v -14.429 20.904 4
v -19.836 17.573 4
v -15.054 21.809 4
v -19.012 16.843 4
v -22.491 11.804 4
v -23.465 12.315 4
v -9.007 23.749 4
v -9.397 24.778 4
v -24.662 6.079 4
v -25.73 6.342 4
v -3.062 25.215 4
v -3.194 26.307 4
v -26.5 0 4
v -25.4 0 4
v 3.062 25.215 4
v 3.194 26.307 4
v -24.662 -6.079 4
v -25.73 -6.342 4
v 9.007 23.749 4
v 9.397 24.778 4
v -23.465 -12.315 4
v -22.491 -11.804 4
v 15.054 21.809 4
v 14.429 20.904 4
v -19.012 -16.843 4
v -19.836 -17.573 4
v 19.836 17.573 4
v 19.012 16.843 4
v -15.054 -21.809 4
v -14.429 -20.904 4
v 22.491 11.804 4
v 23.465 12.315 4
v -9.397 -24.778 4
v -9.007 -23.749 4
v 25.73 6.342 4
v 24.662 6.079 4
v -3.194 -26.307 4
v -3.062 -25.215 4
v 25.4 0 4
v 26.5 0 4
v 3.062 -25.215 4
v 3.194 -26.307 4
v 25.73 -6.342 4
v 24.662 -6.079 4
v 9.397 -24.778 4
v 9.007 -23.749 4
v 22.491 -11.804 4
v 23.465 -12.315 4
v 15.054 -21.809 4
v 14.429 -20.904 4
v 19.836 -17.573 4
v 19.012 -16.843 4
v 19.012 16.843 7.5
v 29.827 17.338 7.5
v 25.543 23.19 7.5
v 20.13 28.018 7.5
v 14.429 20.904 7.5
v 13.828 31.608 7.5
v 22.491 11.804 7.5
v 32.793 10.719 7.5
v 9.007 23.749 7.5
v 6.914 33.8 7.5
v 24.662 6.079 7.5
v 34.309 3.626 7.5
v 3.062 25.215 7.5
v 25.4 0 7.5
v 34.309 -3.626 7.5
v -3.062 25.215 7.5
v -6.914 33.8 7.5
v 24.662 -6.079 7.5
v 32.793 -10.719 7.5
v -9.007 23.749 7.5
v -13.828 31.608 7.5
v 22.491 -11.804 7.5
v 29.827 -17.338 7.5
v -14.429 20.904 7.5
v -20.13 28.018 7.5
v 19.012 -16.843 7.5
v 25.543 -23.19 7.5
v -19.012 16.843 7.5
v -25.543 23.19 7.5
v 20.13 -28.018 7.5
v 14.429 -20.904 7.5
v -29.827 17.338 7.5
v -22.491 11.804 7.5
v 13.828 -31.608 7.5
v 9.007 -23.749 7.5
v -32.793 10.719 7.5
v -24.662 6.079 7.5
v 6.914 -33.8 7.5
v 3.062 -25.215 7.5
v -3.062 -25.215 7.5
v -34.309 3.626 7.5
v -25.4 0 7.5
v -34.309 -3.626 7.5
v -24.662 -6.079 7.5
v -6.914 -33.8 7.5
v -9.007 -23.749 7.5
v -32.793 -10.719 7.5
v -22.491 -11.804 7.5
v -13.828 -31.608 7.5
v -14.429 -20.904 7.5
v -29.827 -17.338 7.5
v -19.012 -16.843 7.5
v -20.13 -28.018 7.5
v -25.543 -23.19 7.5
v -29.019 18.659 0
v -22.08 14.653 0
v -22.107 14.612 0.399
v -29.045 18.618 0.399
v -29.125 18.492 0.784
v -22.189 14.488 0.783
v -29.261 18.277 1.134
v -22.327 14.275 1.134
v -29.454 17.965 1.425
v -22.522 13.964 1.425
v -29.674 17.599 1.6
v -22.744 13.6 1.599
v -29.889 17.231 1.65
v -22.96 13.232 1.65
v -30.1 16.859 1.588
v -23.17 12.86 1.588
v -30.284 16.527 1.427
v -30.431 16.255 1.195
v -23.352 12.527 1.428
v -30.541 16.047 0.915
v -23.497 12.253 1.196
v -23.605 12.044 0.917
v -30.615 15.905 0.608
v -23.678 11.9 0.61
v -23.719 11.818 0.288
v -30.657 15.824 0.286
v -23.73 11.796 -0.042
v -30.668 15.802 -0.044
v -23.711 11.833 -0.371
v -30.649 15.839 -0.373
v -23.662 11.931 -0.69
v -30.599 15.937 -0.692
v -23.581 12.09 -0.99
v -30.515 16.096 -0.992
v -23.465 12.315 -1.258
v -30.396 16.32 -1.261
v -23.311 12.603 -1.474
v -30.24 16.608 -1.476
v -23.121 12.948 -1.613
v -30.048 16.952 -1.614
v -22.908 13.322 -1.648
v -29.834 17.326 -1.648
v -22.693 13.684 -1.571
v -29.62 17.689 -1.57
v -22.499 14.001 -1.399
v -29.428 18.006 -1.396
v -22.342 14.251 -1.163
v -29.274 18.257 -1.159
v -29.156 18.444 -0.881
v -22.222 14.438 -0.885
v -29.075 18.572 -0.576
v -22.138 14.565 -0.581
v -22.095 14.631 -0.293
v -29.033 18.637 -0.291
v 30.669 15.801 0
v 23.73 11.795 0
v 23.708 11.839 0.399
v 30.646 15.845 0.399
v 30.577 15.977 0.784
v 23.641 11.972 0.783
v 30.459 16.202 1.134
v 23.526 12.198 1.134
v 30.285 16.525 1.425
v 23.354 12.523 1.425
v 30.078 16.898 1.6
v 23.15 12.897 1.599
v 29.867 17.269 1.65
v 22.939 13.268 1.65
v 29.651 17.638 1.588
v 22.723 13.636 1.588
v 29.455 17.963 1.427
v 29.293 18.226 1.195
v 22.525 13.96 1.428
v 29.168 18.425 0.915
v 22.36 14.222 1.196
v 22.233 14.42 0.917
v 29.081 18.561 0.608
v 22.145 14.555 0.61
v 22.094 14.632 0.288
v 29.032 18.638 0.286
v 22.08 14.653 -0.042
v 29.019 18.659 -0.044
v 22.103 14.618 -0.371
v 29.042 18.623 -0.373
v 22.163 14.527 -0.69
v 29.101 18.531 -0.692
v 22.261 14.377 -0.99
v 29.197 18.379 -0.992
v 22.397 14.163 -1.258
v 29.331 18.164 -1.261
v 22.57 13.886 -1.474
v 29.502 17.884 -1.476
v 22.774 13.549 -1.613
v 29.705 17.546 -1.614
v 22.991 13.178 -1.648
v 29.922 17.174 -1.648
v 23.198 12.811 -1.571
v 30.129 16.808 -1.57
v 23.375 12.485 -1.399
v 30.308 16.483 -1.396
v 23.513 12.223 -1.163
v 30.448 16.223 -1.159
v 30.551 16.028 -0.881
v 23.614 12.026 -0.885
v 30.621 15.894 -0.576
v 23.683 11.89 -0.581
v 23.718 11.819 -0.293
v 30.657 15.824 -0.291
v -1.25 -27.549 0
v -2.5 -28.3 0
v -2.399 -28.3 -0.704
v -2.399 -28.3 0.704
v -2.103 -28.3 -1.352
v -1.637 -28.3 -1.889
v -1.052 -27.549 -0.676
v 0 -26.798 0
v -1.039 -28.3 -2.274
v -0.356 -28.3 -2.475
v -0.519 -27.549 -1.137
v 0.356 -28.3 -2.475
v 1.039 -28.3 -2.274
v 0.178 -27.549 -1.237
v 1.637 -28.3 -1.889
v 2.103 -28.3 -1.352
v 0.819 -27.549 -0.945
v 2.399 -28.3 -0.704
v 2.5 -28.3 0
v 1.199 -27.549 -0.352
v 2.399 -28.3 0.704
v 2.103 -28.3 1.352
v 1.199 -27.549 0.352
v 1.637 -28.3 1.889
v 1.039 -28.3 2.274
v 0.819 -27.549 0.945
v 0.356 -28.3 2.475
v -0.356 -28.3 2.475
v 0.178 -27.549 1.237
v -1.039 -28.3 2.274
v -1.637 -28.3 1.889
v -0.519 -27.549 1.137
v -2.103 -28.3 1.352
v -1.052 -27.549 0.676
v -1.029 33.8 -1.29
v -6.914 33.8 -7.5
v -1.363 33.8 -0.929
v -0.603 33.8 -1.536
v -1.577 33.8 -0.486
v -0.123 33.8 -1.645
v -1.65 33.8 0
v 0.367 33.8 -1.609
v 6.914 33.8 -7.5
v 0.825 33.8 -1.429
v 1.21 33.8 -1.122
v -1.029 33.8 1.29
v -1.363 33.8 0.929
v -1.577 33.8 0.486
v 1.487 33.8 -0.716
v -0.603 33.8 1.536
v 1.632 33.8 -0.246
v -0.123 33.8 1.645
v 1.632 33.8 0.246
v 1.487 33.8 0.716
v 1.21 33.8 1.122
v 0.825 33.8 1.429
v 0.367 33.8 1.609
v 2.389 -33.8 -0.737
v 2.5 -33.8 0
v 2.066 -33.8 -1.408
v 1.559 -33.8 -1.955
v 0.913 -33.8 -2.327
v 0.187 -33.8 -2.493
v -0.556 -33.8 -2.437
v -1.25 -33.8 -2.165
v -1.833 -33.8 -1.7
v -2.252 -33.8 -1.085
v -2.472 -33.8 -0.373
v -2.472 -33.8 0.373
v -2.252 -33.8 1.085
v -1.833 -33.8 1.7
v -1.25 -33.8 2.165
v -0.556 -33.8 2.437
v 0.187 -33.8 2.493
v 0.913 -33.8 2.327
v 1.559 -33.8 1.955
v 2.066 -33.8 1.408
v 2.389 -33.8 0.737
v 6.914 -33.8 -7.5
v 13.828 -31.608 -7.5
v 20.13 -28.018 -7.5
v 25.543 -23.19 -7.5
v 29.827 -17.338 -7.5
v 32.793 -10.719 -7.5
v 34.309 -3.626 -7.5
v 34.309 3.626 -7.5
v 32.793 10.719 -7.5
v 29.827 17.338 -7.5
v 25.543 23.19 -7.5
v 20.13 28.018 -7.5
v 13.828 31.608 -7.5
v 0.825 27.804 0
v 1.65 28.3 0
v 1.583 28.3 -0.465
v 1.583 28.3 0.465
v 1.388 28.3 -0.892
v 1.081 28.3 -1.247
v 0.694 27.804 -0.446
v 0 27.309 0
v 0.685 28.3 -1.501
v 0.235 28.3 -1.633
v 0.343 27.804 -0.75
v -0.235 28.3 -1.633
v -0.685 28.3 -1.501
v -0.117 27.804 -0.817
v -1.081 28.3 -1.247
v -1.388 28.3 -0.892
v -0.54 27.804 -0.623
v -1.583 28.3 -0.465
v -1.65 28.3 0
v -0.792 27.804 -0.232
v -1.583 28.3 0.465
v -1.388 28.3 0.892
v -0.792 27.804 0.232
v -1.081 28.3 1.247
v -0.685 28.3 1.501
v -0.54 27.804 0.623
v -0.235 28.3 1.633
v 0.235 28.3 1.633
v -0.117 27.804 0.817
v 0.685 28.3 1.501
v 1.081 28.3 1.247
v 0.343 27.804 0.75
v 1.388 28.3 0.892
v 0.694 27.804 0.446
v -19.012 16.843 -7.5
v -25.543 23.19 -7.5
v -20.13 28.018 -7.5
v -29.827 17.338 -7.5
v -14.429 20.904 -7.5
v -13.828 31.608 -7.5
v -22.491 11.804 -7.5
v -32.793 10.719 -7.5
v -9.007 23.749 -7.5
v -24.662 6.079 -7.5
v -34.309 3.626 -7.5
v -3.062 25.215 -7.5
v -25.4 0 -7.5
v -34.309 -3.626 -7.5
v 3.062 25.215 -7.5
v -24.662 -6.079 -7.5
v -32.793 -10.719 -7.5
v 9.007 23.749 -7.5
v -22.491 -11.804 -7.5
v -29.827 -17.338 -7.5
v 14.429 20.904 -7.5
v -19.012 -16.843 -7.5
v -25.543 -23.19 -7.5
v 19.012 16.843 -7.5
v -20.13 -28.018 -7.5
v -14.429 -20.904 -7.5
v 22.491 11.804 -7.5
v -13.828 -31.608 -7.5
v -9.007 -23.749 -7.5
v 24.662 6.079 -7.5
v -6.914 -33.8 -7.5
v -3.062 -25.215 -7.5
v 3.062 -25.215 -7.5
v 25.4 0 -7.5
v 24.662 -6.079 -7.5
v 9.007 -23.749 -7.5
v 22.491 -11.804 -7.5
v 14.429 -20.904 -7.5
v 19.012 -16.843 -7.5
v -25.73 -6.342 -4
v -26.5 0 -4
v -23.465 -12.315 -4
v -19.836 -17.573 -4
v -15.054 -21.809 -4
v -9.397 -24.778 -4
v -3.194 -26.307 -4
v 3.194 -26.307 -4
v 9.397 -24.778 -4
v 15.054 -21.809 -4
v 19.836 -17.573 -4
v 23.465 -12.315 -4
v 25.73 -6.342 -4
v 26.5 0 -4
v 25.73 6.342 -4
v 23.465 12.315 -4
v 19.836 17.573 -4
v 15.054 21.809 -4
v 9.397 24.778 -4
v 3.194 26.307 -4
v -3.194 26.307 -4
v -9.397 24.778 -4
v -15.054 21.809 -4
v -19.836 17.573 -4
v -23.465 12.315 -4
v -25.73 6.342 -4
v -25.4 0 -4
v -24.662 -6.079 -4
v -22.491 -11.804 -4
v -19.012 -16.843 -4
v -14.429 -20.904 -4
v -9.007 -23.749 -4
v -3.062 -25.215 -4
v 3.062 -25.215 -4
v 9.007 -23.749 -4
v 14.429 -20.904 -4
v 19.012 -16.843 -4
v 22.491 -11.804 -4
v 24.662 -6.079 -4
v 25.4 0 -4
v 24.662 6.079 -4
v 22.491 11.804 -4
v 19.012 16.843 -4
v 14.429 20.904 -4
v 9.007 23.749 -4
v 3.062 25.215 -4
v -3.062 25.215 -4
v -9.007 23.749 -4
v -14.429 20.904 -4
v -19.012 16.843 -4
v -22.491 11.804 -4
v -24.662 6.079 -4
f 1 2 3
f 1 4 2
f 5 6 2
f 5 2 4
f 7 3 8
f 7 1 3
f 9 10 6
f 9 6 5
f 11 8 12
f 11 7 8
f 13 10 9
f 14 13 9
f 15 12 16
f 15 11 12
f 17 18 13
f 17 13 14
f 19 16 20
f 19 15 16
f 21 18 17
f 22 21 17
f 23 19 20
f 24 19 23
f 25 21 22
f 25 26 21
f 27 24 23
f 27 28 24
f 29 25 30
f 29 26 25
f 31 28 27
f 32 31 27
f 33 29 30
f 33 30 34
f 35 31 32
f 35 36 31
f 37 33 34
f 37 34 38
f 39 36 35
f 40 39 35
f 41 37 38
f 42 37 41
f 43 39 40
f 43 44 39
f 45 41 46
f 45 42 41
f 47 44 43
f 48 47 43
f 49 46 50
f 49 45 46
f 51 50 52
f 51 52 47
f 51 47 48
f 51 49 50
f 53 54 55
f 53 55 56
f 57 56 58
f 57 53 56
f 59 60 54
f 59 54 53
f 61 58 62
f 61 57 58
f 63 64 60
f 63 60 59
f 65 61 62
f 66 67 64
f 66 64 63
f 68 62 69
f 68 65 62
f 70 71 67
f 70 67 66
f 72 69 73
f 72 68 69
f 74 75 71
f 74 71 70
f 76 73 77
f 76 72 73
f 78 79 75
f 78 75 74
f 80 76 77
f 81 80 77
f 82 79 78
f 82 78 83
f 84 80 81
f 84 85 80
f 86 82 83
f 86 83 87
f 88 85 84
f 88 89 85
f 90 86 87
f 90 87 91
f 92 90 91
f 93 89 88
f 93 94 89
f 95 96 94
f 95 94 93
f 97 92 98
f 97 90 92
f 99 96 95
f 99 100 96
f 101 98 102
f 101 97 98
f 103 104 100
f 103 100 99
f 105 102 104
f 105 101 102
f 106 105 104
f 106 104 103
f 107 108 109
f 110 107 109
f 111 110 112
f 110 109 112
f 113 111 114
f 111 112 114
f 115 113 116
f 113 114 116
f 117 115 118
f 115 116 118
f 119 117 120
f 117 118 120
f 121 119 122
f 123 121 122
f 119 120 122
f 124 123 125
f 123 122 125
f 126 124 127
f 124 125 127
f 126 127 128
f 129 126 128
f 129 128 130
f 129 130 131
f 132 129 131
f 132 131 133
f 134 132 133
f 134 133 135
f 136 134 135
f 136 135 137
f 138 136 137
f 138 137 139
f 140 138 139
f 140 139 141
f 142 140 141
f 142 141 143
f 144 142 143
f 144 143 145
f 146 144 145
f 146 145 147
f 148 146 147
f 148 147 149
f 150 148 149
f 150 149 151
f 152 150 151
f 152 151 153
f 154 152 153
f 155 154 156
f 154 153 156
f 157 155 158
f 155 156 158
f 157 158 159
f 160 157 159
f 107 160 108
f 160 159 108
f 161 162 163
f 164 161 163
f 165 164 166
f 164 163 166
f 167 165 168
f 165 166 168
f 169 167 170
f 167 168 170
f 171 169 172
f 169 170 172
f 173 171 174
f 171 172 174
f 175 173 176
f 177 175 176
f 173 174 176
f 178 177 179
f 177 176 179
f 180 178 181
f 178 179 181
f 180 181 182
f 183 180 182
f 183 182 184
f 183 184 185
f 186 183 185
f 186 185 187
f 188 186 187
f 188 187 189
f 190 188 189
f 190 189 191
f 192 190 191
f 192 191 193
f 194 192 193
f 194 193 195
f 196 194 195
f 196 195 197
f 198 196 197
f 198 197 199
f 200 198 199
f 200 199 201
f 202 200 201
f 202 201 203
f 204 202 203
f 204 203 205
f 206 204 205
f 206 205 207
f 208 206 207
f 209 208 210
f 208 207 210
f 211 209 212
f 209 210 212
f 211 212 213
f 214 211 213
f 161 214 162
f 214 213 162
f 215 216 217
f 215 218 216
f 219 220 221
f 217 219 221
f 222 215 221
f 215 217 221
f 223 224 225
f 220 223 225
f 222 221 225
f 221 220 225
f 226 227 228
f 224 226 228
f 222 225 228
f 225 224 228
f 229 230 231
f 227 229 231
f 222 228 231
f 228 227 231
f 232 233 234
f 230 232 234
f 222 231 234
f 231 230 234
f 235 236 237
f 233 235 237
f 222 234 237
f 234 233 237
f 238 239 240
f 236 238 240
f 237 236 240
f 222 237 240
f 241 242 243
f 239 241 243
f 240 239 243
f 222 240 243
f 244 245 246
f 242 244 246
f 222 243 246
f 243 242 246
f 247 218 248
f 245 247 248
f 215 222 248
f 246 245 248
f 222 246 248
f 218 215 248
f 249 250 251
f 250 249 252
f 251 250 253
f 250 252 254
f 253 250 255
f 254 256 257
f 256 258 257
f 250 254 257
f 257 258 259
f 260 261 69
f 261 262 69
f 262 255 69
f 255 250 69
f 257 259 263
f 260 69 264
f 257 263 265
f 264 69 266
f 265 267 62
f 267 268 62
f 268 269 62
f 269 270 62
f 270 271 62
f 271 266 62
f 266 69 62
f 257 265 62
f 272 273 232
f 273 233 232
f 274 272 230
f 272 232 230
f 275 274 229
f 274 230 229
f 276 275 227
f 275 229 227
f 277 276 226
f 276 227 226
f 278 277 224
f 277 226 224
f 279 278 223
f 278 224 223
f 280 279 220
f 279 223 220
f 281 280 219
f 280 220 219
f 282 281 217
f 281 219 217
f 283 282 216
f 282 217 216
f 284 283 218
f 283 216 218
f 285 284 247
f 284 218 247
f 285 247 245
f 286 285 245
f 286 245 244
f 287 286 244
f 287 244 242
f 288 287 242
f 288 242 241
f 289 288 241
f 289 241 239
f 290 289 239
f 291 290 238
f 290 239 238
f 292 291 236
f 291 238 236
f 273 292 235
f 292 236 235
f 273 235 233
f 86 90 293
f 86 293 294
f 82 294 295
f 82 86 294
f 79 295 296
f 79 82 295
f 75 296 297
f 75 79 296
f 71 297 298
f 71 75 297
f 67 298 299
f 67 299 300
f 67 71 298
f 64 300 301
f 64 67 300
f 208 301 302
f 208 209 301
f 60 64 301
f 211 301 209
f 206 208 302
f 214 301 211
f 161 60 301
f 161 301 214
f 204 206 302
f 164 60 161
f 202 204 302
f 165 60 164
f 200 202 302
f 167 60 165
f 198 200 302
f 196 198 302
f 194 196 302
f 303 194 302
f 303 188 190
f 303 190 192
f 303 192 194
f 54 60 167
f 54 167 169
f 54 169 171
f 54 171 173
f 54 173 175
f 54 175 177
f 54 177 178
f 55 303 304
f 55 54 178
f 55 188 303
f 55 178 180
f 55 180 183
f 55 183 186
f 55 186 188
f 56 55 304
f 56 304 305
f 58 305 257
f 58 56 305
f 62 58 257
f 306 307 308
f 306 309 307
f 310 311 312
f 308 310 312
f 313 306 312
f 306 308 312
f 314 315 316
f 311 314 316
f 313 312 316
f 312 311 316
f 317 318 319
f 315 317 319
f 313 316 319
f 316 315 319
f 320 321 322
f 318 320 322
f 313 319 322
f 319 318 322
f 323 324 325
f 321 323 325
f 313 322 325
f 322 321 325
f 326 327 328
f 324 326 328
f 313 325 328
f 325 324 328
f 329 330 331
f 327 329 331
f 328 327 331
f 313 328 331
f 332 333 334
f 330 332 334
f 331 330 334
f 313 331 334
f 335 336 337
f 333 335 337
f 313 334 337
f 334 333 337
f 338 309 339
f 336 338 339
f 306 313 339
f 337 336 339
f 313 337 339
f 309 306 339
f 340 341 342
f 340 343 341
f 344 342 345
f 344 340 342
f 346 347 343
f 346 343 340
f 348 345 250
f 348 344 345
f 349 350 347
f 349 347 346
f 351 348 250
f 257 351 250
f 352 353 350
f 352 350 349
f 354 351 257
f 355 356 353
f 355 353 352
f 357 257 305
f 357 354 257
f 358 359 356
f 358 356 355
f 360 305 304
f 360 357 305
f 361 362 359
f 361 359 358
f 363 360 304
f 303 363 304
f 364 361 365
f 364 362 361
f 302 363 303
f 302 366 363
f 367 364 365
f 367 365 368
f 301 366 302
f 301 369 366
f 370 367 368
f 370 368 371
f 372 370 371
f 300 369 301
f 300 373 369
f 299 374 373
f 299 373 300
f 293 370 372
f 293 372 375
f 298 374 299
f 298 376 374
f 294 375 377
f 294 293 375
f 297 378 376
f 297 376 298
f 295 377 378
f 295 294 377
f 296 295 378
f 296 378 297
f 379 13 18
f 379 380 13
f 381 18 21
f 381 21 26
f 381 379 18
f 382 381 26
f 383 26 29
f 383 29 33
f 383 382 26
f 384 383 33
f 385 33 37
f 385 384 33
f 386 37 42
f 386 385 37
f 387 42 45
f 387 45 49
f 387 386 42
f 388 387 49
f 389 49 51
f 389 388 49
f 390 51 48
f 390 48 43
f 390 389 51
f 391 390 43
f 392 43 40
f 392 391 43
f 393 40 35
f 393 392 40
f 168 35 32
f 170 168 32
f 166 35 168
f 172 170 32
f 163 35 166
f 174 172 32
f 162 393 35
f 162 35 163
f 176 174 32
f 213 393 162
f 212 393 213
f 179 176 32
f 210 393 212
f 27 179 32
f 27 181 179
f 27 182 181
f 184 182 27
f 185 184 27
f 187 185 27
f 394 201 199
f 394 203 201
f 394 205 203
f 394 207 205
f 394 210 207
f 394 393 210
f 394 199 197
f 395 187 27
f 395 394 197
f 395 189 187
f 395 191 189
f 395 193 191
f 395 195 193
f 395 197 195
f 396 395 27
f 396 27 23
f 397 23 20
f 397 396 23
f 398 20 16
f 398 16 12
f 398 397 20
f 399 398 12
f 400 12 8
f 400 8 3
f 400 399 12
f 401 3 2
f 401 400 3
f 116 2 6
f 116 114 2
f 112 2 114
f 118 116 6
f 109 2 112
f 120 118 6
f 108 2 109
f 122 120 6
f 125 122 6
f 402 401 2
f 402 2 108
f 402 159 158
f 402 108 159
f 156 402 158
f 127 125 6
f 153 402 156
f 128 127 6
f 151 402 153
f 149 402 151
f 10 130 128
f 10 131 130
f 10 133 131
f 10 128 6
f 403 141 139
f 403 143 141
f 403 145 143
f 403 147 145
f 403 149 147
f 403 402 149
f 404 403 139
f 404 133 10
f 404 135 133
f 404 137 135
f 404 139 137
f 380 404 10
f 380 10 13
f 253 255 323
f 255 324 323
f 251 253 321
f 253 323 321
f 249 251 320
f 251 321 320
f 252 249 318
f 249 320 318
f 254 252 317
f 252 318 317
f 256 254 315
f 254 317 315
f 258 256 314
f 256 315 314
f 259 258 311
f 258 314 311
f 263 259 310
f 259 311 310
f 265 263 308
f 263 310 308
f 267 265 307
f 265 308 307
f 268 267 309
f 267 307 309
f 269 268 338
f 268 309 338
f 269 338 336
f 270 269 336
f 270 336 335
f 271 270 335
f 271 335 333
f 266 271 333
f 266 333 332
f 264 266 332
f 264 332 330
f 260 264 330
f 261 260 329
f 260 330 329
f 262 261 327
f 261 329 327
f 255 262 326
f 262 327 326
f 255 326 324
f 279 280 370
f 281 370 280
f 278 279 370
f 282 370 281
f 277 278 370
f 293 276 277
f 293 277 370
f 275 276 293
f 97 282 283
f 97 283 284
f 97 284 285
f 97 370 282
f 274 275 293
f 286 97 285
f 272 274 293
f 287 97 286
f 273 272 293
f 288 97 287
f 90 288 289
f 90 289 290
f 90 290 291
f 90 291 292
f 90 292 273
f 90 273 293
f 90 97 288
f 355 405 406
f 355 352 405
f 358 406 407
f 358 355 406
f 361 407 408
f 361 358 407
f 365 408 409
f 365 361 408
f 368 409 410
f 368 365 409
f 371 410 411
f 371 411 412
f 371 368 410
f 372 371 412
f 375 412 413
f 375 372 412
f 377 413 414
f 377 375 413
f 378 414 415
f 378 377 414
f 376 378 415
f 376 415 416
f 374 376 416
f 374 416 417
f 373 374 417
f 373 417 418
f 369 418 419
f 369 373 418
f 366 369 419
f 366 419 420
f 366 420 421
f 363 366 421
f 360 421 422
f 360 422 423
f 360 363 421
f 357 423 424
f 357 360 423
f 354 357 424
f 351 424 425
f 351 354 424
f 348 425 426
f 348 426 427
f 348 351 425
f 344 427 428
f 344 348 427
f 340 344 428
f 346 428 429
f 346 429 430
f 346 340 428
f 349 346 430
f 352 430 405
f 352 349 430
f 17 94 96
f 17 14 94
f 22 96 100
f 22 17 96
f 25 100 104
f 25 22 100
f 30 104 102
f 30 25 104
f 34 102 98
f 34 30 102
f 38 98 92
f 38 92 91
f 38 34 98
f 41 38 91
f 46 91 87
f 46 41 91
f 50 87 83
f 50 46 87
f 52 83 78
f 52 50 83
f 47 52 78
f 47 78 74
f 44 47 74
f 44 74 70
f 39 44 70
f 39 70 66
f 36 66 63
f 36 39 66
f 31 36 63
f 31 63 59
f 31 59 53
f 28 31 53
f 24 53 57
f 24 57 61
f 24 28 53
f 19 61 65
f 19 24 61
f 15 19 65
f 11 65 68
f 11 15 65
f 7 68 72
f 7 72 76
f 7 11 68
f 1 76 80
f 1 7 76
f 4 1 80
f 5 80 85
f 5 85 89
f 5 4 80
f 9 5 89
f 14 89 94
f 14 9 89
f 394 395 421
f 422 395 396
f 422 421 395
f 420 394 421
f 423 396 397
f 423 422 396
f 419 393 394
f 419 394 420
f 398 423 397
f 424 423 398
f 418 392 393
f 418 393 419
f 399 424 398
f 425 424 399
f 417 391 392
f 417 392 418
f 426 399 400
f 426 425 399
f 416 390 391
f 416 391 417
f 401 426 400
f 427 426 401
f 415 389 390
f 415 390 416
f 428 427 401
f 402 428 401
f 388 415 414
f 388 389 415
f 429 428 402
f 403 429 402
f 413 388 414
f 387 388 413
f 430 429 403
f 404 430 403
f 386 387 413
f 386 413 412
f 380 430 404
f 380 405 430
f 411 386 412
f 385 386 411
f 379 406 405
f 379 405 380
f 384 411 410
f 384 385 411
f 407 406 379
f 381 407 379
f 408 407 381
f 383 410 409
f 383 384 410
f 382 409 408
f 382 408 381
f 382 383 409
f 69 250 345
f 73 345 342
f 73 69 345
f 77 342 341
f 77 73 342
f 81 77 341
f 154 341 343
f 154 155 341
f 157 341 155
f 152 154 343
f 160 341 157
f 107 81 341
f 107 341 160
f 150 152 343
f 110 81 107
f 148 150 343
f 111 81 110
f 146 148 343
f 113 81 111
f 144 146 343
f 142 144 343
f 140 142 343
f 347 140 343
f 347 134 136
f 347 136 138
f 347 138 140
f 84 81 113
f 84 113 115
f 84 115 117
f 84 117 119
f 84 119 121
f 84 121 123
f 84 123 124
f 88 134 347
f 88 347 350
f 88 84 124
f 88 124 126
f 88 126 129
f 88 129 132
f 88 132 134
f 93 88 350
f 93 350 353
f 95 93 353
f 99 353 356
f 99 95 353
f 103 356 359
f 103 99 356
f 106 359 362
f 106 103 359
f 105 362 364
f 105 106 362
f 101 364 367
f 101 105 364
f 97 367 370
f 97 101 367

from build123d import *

# Parameters (mm, degrees)
SKETCH_2_W                       = 64.02174429
SKETCH_2_H                       = 9.248919907
CUT_EXTRUDE_1_DEPTH              = 49
HOLE_WIZARD_M4_2_D               = 3.3
HOLE_WIZARD_M4_2_DEPTH           = 5.5
HOLE_WIZARD_M4_2_TIP             = 0.991420021
HOLE_WIZARD_M6_2_D               = 5
HOLE_WIZARD_M6_2_DEPTH           = 5.5
HOLE_WIZARD_M6_2_TIP             = 1.502151548
HOLE_WIZARD_M4_3_D               = 3.3
HOLE_WIZARD_M4_3_DEPTH           = 13.4
HOLE_WIZARD_M4_3_TIP             = 0.991420021
HOLE_WIZARD_M4_3_ON_FACE_2_D     = 3.3
HOLE_WIZARD_M4_3_ON_FACE_2_DEPTH = 13.4
HOLE_WIZARD_M4_3_ON_FACE_2_TIP   = 0.991420021


with BuildPart() as part:
    # 草图1 → 旋转1 (revolve)
    with BuildSketch(Plane(origin=(0, 0, 0), x_dir=(1, 0, 0), z_dir=(0, 1, 0)), mode=Mode.PRIVATE) as revolve_1_sk:
        Polygon((34.5, 7.5), (34.5, -7.5), (25.4, -7.5), (25.4, -4), (26.5, -4), (26.5, 4), (25.4, 4), (25.4, 7.5), align=None)
    revolve(revolve_1_sk.sketch.rotate(Axis((0, 0, -31.9390681), (0, 0, 1)), 180), axis=Axis((0, 0, -31.9390681), (0, 0, 1)))  # turned: the seam where the file's is

    # 草图2 → 切除-拉伸1 (cut)
    with BuildSketch(Plane.XY.offset(7.5)):
        with Locations((-1.141100508, 38.424459954)):
            Rectangle(SKETCH_2_W, SKETCH_2_H)
        with Locations((-1.141100508, -38.424459954)):
            Rectangle(SKETCH_2_W, SKETCH_2_H)
    extrude(amount=-CUT_EXTRUDE_1_DEPTH, mode=Mode.SUBTRACT)

    # M4 螺纹孔2
    with Locations(Plane(origin=(0, 33.8, 0), x_dir=(1, 0, 0), z_dir=(0, 1, 0))):
        with Locations((0, 0)):
            Hole(HOLE_WIZARD_M4_2_D / 2, depth=HOLE_WIZARD_M4_2_DEPTH)
            with Locations((0, 0, -(HOLE_WIZARD_M4_2_DEPTH + HOLE_WIZARD_M4_2_TIP / 2))):  # 118° drill point
                Cone(0, HOLE_WIZARD_M4_2_D / 2, HOLE_WIZARD_M4_2_TIP, mode=Mode.SUBTRACT)

    # M6 螺纹孔2
    with Locations(Plane(origin=(0, -33.8, 0), x_dir=(-1, 0, 0), z_dir=(0, -1, 0))):
        with Locations((0, 0)):
            Hole(HOLE_WIZARD_M6_2_D / 2, depth=HOLE_WIZARD_M6_2_DEPTH)
            with Locations((0, 0, -(HOLE_WIZARD_M6_2_DEPTH + HOLE_WIZARD_M6_2_TIP / 2))):  # 118° drill point
                Cone(0, HOLE_WIZARD_M6_2_D / 2, HOLE_WIZARD_M6_2_TIP, mode=Mode.SUBTRACT)

    # M4 螺纹孔3
    with Locations(Plane(origin=(29.877876431, 17.25, 0), x_dir=(-0.5, 0.866025404, 0), z_dir=(0.866025404, 0.5, 0))):
        with Locations((0, 0)):
            Hole(HOLE_WIZARD_M4_3_D / 2, depth=HOLE_WIZARD_M4_3_DEPTH)
            with Locations((0, 0, -(HOLE_WIZARD_M4_3_DEPTH + HOLE_WIZARD_M4_3_TIP / 2))):  # 118° drill point
                Cone(0, HOLE_WIZARD_M4_3_D / 2, HOLE_WIZARD_M4_3_TIP, mode=Mode.SUBTRACT)

    # M4 螺纹孔3 on face 2
    with Locations(Plane(origin=(-29.877876431, 17.25, 0), x_dir=(-0.500000175, -0.866025303, 0), z_dir=(-0.866025303, 0.500000175, 0))):
        with Locations((0, 0)):
            Hole(HOLE_WIZARD_M4_3_ON_FACE_2_D / 2, depth=HOLE_WIZARD_M4_3_ON_FACE_2_DEPTH)
            with Locations((0, 0, -(HOLE_WIZARD_M4_3_ON_FACE_2_DEPTH + HOLE_WIZARD_M4_3_ON_FACE_2_TIP / 2))):  # 118° drill point
                Cone(0, HOLE_WIZARD_M4_3_ON_FACE_2_D / 2, HOLE_WIZARD_M4_3_ON_FACE_2_TIP, mode=Mode.SUBTRACT)


solid = part.part
